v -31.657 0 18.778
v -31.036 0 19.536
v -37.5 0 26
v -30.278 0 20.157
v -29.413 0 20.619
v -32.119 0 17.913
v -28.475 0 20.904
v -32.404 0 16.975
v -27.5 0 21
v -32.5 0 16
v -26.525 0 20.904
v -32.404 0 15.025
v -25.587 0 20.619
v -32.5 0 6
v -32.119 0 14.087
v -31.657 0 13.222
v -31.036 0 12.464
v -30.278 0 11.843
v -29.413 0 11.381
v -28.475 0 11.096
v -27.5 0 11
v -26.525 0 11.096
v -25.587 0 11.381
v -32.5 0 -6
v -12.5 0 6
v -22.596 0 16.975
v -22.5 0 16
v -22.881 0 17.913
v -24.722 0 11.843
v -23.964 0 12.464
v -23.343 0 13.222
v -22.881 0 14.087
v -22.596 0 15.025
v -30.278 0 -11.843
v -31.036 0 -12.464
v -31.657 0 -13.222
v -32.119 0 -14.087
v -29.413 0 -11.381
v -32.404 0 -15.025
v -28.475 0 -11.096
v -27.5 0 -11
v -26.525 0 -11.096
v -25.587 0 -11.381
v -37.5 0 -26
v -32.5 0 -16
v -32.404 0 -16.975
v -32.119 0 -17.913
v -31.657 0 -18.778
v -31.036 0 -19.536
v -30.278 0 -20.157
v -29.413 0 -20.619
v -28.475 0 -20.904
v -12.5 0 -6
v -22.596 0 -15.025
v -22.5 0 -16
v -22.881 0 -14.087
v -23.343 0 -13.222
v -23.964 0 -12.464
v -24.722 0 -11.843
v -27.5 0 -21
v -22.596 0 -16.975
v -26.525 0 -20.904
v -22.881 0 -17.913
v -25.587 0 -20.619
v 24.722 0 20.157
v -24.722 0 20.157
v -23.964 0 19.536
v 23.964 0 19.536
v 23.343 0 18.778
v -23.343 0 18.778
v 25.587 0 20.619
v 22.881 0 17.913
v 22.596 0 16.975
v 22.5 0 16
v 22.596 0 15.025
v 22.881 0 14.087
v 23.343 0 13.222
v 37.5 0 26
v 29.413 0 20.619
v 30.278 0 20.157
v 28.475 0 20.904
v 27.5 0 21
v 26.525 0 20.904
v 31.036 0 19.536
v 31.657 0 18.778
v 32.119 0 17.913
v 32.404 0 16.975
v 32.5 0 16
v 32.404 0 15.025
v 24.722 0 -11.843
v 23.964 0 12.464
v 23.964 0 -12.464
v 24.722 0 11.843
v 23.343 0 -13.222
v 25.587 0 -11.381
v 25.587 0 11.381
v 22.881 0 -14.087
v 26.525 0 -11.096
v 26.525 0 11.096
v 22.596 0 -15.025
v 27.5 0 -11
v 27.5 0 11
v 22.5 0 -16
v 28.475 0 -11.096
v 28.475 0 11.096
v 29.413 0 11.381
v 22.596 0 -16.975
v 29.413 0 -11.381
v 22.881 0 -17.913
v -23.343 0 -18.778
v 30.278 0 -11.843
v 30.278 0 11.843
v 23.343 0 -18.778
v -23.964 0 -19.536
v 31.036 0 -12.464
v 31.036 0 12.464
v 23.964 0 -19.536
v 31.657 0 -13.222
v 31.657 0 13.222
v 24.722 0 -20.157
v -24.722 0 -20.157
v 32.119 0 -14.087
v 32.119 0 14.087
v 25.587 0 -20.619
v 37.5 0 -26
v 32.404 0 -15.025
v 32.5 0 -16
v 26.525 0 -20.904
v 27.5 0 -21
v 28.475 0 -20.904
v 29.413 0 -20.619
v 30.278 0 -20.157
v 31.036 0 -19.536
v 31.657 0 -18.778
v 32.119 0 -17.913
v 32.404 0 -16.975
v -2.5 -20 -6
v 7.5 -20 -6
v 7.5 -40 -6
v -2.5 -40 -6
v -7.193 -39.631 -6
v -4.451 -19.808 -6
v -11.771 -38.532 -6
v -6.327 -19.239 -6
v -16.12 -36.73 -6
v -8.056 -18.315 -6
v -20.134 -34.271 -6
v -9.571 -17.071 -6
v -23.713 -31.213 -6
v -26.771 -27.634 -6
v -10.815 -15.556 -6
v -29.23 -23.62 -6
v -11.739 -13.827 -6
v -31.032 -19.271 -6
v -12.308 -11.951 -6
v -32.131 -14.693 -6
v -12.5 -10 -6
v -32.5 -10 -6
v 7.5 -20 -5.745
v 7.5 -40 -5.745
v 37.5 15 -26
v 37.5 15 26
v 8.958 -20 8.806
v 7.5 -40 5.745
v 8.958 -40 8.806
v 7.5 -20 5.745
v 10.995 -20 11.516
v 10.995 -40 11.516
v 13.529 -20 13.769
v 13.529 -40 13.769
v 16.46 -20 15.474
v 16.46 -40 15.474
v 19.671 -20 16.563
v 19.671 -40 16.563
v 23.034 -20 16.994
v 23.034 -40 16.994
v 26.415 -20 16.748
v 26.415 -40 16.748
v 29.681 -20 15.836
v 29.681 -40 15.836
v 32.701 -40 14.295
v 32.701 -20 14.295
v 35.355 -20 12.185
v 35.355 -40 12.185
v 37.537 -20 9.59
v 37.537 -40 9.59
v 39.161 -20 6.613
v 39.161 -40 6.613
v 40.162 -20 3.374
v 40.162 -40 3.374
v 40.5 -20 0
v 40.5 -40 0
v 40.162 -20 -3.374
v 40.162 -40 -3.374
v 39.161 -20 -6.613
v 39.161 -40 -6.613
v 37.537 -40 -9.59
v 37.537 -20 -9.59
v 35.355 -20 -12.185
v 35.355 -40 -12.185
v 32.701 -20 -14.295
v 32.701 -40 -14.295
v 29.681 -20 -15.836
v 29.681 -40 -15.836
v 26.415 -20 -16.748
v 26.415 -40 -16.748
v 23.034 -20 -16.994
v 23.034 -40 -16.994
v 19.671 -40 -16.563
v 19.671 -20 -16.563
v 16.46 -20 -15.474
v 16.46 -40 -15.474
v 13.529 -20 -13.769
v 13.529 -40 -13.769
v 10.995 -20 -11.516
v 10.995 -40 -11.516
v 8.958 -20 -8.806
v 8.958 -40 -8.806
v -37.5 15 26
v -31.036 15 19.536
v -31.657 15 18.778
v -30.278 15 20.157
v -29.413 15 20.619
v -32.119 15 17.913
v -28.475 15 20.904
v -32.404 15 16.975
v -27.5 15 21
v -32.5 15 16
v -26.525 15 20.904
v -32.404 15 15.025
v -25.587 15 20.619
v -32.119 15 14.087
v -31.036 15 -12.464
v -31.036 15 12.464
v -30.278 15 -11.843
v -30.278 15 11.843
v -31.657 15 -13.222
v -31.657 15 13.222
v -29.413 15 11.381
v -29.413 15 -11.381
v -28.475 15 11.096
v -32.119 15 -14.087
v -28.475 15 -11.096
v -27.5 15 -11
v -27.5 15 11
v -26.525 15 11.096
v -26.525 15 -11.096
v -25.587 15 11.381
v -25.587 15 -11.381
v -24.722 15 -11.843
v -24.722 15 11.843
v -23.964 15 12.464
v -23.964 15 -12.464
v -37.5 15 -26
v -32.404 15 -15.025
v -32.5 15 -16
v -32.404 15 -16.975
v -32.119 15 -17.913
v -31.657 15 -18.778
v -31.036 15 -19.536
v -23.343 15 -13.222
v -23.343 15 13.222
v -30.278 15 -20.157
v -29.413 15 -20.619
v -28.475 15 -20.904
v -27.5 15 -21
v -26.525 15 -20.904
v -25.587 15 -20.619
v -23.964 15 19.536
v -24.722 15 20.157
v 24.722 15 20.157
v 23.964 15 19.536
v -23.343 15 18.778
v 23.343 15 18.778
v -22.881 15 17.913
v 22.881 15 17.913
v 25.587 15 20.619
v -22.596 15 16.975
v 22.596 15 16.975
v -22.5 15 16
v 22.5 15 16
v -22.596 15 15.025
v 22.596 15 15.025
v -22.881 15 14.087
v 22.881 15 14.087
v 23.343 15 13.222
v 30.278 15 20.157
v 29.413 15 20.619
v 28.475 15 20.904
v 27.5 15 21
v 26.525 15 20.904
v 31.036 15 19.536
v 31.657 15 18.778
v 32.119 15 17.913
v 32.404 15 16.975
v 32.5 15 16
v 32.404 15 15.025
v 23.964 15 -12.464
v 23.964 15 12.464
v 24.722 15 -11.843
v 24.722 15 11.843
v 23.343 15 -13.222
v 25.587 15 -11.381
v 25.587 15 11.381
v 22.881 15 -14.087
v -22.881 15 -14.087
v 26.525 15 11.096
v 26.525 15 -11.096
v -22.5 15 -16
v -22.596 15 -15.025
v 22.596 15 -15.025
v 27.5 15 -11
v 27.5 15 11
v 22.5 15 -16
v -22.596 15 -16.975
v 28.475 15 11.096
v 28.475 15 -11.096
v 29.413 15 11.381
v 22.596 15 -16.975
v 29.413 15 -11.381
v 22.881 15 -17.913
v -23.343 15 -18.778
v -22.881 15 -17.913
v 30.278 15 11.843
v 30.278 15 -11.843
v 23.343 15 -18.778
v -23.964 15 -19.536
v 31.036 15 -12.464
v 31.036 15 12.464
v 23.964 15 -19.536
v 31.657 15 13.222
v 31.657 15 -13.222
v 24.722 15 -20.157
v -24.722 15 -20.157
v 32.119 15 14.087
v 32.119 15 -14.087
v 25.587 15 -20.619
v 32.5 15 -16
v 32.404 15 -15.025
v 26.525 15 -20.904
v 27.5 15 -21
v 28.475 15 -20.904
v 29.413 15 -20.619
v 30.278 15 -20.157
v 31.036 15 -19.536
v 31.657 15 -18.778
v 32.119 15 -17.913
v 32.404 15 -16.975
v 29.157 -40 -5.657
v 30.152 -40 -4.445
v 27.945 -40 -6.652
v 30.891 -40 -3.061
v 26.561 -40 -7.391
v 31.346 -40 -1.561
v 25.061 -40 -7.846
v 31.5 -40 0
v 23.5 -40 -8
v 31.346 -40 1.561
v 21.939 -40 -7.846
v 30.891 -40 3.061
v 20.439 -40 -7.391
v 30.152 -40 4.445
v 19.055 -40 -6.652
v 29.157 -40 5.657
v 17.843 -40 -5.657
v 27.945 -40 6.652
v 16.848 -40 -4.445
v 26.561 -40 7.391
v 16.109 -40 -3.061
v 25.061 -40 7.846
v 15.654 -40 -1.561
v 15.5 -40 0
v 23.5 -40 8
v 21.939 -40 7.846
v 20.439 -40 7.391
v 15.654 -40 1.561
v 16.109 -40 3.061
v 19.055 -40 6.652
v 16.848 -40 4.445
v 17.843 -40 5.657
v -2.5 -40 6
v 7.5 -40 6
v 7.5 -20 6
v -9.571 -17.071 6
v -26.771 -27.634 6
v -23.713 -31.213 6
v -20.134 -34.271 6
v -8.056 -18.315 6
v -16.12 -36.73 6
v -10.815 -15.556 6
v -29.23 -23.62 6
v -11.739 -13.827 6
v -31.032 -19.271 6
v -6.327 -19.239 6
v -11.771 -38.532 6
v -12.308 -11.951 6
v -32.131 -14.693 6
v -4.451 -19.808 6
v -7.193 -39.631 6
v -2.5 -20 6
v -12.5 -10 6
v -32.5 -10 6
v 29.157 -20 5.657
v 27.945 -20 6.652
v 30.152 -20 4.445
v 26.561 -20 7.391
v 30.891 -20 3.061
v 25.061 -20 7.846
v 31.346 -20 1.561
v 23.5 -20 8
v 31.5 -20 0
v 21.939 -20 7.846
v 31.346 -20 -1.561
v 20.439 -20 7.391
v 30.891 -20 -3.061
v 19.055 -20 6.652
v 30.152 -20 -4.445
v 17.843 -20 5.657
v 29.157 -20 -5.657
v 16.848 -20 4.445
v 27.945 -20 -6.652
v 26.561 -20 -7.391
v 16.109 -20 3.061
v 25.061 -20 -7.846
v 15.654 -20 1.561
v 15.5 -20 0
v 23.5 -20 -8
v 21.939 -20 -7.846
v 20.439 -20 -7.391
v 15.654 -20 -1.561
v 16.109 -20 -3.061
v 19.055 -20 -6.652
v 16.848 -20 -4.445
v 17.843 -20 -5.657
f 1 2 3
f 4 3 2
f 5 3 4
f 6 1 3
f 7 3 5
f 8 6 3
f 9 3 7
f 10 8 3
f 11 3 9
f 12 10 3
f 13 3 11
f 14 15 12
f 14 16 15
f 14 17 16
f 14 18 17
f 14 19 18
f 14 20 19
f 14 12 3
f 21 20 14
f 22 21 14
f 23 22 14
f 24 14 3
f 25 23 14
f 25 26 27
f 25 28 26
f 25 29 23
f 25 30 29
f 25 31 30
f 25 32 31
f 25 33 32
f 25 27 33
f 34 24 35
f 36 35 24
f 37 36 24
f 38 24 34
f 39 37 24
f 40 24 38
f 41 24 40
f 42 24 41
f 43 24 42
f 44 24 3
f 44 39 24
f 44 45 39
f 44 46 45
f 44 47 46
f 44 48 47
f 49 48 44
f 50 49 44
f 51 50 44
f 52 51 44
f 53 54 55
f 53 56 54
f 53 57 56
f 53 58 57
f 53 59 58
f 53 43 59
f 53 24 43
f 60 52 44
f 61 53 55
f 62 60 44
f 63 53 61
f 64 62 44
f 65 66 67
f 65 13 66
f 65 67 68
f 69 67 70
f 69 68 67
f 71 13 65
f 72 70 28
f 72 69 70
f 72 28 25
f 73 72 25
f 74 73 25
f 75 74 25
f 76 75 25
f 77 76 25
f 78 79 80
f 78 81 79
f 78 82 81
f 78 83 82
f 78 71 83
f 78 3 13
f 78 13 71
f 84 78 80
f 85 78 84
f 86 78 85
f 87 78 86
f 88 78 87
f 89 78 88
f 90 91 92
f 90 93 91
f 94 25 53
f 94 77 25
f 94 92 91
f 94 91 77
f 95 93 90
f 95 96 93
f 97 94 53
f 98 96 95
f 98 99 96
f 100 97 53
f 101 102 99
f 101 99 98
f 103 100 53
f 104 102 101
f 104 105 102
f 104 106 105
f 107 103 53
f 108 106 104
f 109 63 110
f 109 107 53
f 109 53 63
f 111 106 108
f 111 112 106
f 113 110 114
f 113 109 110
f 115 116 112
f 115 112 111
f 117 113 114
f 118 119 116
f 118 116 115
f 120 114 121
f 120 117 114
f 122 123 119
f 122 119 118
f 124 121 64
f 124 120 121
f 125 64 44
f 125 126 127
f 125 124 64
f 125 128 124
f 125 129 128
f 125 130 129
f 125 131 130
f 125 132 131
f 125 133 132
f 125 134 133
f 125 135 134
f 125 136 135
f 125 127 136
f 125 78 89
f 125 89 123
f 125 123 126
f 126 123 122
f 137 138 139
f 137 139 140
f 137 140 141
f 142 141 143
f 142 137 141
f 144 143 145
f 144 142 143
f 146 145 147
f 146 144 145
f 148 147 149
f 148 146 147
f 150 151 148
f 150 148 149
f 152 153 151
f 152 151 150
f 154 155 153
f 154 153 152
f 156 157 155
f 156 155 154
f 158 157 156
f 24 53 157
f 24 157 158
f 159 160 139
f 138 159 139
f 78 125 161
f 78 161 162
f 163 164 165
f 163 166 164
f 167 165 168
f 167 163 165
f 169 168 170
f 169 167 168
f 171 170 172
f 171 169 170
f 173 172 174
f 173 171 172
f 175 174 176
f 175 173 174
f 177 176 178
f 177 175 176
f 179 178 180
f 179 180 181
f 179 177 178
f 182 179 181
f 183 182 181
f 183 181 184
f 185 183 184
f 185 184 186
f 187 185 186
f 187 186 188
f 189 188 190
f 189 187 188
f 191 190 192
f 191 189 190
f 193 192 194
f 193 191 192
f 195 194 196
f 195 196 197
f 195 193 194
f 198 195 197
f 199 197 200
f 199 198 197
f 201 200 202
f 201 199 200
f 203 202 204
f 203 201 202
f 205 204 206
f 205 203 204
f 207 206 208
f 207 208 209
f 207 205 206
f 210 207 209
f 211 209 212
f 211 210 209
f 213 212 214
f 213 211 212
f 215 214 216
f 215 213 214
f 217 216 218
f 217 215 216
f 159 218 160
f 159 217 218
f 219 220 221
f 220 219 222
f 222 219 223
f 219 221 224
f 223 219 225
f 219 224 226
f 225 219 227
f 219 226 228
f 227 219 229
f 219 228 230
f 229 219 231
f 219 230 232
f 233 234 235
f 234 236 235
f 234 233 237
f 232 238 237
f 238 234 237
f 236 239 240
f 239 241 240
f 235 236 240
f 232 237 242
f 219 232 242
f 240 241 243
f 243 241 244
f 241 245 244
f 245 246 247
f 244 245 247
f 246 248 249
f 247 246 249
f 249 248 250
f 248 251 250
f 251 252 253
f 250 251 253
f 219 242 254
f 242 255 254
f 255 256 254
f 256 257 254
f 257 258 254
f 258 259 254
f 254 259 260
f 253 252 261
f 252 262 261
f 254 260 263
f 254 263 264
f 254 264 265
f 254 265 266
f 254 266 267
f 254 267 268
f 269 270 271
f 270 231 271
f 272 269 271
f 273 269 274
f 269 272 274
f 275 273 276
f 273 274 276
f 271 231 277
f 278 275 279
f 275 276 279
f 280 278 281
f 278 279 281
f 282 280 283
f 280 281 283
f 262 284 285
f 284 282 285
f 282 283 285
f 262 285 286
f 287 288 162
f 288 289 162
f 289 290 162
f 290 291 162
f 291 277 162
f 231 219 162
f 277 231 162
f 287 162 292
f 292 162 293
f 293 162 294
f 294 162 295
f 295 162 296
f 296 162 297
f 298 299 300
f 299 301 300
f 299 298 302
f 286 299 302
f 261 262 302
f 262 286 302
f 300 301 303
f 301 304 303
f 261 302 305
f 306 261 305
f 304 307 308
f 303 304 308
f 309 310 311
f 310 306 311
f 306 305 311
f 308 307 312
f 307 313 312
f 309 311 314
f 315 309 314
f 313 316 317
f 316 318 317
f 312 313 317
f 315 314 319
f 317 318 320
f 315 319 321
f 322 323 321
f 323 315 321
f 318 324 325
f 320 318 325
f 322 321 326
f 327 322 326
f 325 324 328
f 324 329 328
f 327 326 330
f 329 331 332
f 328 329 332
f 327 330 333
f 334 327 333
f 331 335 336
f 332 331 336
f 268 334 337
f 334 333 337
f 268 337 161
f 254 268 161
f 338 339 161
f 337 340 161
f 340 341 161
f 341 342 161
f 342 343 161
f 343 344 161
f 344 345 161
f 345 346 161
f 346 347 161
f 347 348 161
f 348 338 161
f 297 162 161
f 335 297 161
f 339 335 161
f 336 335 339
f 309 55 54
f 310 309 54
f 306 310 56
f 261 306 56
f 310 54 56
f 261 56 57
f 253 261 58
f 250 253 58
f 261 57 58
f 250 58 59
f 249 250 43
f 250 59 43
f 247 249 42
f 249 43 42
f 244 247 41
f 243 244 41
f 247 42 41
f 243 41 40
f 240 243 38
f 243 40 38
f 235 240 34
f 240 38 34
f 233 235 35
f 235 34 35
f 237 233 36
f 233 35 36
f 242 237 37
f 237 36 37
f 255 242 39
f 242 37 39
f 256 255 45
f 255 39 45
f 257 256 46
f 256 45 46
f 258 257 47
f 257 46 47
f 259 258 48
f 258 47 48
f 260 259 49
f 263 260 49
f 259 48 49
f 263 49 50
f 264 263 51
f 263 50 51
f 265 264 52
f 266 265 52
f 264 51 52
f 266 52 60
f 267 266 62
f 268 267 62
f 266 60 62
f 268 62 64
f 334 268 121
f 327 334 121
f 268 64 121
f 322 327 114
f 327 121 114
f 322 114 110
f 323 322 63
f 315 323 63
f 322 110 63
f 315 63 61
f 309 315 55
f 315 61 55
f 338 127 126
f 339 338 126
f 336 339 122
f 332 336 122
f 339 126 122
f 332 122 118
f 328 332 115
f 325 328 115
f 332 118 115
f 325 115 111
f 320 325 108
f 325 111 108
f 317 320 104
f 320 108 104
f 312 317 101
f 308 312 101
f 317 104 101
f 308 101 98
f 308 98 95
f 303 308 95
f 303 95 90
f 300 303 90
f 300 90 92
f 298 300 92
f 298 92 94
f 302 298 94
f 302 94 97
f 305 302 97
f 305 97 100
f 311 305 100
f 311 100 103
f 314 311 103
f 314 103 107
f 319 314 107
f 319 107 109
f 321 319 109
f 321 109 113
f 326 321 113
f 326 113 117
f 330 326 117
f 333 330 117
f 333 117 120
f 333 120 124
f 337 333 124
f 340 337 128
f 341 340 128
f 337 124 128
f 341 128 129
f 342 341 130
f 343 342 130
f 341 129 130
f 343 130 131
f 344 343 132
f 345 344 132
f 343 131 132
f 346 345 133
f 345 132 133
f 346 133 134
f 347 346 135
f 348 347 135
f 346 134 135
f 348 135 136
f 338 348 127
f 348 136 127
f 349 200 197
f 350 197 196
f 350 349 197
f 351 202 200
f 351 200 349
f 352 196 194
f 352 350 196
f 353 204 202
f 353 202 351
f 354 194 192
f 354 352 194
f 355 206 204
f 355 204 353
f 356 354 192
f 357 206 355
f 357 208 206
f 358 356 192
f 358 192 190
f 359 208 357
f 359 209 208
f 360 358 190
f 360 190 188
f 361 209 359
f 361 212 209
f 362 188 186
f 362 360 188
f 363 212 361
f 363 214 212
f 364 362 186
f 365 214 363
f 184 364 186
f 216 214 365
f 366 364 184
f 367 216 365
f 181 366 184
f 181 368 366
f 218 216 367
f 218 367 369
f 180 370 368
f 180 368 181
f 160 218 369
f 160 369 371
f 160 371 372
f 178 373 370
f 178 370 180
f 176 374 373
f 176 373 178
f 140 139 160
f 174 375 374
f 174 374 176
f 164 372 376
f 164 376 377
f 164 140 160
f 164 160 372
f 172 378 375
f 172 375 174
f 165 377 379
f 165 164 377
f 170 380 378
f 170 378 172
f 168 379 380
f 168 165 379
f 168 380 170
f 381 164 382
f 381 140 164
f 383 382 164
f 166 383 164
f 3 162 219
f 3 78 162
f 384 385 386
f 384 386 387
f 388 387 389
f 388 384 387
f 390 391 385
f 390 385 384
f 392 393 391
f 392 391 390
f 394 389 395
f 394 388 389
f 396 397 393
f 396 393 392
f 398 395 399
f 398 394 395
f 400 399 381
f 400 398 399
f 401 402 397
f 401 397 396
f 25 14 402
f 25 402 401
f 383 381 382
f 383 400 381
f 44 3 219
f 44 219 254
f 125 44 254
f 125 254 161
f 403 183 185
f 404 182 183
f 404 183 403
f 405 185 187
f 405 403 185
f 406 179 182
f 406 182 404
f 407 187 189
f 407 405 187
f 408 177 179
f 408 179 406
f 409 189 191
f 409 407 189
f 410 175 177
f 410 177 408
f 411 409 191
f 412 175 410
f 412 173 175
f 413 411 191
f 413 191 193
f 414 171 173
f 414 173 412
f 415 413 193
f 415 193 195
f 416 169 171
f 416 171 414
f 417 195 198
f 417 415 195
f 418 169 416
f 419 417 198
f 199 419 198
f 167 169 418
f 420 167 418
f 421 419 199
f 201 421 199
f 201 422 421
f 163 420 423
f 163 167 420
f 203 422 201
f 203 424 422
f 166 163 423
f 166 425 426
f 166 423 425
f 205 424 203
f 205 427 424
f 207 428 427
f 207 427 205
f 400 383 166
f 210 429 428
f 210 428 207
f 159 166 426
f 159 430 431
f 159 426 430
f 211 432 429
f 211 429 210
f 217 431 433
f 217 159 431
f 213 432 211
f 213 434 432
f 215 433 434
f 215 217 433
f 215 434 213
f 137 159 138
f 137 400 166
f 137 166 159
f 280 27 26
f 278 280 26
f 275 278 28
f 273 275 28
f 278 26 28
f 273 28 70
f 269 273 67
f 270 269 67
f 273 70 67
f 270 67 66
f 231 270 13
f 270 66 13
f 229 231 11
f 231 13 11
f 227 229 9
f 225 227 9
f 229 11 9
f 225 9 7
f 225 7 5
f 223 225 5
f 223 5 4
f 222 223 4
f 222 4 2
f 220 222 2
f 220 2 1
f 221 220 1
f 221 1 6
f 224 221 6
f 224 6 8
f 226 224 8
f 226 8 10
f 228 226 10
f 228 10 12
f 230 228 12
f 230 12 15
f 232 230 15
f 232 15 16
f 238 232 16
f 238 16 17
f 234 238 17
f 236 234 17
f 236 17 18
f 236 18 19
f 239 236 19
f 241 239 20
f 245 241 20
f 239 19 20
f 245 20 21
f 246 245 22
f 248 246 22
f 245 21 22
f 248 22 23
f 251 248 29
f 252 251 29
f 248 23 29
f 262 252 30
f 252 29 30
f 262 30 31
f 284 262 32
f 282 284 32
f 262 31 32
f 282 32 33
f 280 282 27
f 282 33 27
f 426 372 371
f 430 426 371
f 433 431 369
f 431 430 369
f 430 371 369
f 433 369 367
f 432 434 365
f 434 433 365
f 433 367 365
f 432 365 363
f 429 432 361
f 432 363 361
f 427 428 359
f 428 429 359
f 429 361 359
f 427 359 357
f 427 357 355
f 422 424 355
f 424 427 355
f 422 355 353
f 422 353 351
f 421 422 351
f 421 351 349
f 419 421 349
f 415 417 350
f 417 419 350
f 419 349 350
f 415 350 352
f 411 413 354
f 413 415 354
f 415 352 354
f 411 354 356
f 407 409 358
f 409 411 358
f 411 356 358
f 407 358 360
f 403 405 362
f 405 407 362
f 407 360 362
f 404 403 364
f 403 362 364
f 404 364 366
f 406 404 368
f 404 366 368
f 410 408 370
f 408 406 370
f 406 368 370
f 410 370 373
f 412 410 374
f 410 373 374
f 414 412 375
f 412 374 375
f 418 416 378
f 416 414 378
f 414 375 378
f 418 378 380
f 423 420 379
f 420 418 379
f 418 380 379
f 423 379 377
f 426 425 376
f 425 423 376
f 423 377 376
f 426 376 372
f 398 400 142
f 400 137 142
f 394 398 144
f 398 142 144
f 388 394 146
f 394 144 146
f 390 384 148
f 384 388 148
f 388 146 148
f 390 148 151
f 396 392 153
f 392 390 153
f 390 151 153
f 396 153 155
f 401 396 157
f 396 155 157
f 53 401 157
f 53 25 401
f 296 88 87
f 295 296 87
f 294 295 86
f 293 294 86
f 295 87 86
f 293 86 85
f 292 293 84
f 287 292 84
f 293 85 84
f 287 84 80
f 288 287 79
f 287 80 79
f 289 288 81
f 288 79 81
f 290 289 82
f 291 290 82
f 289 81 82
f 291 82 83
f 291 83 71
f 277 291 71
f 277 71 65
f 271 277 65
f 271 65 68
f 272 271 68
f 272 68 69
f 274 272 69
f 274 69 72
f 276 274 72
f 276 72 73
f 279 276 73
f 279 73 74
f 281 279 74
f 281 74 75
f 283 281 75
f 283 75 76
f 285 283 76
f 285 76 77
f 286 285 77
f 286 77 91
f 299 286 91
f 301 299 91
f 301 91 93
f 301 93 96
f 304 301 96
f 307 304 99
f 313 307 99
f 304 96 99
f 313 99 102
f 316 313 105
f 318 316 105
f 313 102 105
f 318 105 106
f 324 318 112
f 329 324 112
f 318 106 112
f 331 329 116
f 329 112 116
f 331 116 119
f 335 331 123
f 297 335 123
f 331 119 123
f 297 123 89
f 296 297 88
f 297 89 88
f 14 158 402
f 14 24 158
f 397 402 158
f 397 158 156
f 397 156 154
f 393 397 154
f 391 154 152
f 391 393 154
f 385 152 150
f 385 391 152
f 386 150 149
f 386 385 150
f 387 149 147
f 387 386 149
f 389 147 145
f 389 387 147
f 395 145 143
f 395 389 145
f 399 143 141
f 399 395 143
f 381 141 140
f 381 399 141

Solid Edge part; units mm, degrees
sketch "Sketch1" plane through (0, 0, 0) normal (0, -1, 0) x (1, 0, 0)
  line L0 (37.5, 26) -> (-37.5, 26)
  line L1 (-37.5, 26) -> (-37.5, -26)
  line L2 (-37.5, -26) -> (37.5, -26)
  line L3 (37.5, -26) -> (37.5, 26)
extrude "Protrusion1" add sketch "Sketch1" against normal blind 15
sketch "Sketch2" plane through (0, 0, 0) normal (0, -1, 0) x (1, 0, 0)
  circle A0 centre (-27.5, 16) radius 5
  circle A1 centre (27.5, 16) radius 5
  circle A2 centre (27.5, -16) radius 5
  circle A3 centre (-27.5, -16) radius 5
extrude "Cutout1" cut sketch "Sketch2" against normal up to next
sketch "Sketch3" plane through (0, 0, 0) normal (0, -1, 0) x (1, 0, 0)
  line L0 (-32.5, 6) -> (-12.5, 6)
  line L1 (-12.5, 6) -> (-12.5, -6)
  line L2 (-12.5, -6) -> (-32.5, -6)
  line L3 (-32.5, -6) -> (-32.5, 6)
extrude "ExtrudedProtrusion_3" add sketch "Sketch3" along normal blind 10
sketch "Sketch4" plane through (-22.5, -10, 0) normal (0, -1, 0) x (1, 0, 0)
  line L0 (-10, 6) -> (10, 6)
  line L1 (10, 6) -> (10, -6)
  line L2 (10, -6) -> (-10, -6)
  line L3 (-10, -6) -> (-10, 6)
revolve "RevolvedProtrusion_2" add sketch "Sketch4" angle 90 about axis through (-2.5, -10, -6) along (0, 0, 1)
sketch "Sketch5" plane through (-2.5, -30, 0) normal (1, 0, 0) x (0, 0, 1)
  line L0 (-6, 10) -> (6, 10)
  line L1 (6, 10) -> (6, -10)
  line L2 (6, -10) -> (-6, -10)
  line L3 (-6, -10) -> (-6, 10)
extrude "ExtrudedProtrusion_4" add sketch "Sketch5" along normal blind 10
sketch "Sketch6" plane through (-12.5, -20, 0) normal (0, 0, -1) x (0, -1, 0)
  line L0 (20, -28) -> (20, -19)
  line L1 (20, -19) -> (0, -19)
  line L2 (0, -19) -> (0, -20)
  line L3 (0, -20) -> (0, -28)
  line L4 (0, -28) -> (20, -28)
revolve "RevolvedProtrusion1" add sketch "Sketch6" angle 360 about axis through (23.5, -40, 0) along (0, 1, 0)
